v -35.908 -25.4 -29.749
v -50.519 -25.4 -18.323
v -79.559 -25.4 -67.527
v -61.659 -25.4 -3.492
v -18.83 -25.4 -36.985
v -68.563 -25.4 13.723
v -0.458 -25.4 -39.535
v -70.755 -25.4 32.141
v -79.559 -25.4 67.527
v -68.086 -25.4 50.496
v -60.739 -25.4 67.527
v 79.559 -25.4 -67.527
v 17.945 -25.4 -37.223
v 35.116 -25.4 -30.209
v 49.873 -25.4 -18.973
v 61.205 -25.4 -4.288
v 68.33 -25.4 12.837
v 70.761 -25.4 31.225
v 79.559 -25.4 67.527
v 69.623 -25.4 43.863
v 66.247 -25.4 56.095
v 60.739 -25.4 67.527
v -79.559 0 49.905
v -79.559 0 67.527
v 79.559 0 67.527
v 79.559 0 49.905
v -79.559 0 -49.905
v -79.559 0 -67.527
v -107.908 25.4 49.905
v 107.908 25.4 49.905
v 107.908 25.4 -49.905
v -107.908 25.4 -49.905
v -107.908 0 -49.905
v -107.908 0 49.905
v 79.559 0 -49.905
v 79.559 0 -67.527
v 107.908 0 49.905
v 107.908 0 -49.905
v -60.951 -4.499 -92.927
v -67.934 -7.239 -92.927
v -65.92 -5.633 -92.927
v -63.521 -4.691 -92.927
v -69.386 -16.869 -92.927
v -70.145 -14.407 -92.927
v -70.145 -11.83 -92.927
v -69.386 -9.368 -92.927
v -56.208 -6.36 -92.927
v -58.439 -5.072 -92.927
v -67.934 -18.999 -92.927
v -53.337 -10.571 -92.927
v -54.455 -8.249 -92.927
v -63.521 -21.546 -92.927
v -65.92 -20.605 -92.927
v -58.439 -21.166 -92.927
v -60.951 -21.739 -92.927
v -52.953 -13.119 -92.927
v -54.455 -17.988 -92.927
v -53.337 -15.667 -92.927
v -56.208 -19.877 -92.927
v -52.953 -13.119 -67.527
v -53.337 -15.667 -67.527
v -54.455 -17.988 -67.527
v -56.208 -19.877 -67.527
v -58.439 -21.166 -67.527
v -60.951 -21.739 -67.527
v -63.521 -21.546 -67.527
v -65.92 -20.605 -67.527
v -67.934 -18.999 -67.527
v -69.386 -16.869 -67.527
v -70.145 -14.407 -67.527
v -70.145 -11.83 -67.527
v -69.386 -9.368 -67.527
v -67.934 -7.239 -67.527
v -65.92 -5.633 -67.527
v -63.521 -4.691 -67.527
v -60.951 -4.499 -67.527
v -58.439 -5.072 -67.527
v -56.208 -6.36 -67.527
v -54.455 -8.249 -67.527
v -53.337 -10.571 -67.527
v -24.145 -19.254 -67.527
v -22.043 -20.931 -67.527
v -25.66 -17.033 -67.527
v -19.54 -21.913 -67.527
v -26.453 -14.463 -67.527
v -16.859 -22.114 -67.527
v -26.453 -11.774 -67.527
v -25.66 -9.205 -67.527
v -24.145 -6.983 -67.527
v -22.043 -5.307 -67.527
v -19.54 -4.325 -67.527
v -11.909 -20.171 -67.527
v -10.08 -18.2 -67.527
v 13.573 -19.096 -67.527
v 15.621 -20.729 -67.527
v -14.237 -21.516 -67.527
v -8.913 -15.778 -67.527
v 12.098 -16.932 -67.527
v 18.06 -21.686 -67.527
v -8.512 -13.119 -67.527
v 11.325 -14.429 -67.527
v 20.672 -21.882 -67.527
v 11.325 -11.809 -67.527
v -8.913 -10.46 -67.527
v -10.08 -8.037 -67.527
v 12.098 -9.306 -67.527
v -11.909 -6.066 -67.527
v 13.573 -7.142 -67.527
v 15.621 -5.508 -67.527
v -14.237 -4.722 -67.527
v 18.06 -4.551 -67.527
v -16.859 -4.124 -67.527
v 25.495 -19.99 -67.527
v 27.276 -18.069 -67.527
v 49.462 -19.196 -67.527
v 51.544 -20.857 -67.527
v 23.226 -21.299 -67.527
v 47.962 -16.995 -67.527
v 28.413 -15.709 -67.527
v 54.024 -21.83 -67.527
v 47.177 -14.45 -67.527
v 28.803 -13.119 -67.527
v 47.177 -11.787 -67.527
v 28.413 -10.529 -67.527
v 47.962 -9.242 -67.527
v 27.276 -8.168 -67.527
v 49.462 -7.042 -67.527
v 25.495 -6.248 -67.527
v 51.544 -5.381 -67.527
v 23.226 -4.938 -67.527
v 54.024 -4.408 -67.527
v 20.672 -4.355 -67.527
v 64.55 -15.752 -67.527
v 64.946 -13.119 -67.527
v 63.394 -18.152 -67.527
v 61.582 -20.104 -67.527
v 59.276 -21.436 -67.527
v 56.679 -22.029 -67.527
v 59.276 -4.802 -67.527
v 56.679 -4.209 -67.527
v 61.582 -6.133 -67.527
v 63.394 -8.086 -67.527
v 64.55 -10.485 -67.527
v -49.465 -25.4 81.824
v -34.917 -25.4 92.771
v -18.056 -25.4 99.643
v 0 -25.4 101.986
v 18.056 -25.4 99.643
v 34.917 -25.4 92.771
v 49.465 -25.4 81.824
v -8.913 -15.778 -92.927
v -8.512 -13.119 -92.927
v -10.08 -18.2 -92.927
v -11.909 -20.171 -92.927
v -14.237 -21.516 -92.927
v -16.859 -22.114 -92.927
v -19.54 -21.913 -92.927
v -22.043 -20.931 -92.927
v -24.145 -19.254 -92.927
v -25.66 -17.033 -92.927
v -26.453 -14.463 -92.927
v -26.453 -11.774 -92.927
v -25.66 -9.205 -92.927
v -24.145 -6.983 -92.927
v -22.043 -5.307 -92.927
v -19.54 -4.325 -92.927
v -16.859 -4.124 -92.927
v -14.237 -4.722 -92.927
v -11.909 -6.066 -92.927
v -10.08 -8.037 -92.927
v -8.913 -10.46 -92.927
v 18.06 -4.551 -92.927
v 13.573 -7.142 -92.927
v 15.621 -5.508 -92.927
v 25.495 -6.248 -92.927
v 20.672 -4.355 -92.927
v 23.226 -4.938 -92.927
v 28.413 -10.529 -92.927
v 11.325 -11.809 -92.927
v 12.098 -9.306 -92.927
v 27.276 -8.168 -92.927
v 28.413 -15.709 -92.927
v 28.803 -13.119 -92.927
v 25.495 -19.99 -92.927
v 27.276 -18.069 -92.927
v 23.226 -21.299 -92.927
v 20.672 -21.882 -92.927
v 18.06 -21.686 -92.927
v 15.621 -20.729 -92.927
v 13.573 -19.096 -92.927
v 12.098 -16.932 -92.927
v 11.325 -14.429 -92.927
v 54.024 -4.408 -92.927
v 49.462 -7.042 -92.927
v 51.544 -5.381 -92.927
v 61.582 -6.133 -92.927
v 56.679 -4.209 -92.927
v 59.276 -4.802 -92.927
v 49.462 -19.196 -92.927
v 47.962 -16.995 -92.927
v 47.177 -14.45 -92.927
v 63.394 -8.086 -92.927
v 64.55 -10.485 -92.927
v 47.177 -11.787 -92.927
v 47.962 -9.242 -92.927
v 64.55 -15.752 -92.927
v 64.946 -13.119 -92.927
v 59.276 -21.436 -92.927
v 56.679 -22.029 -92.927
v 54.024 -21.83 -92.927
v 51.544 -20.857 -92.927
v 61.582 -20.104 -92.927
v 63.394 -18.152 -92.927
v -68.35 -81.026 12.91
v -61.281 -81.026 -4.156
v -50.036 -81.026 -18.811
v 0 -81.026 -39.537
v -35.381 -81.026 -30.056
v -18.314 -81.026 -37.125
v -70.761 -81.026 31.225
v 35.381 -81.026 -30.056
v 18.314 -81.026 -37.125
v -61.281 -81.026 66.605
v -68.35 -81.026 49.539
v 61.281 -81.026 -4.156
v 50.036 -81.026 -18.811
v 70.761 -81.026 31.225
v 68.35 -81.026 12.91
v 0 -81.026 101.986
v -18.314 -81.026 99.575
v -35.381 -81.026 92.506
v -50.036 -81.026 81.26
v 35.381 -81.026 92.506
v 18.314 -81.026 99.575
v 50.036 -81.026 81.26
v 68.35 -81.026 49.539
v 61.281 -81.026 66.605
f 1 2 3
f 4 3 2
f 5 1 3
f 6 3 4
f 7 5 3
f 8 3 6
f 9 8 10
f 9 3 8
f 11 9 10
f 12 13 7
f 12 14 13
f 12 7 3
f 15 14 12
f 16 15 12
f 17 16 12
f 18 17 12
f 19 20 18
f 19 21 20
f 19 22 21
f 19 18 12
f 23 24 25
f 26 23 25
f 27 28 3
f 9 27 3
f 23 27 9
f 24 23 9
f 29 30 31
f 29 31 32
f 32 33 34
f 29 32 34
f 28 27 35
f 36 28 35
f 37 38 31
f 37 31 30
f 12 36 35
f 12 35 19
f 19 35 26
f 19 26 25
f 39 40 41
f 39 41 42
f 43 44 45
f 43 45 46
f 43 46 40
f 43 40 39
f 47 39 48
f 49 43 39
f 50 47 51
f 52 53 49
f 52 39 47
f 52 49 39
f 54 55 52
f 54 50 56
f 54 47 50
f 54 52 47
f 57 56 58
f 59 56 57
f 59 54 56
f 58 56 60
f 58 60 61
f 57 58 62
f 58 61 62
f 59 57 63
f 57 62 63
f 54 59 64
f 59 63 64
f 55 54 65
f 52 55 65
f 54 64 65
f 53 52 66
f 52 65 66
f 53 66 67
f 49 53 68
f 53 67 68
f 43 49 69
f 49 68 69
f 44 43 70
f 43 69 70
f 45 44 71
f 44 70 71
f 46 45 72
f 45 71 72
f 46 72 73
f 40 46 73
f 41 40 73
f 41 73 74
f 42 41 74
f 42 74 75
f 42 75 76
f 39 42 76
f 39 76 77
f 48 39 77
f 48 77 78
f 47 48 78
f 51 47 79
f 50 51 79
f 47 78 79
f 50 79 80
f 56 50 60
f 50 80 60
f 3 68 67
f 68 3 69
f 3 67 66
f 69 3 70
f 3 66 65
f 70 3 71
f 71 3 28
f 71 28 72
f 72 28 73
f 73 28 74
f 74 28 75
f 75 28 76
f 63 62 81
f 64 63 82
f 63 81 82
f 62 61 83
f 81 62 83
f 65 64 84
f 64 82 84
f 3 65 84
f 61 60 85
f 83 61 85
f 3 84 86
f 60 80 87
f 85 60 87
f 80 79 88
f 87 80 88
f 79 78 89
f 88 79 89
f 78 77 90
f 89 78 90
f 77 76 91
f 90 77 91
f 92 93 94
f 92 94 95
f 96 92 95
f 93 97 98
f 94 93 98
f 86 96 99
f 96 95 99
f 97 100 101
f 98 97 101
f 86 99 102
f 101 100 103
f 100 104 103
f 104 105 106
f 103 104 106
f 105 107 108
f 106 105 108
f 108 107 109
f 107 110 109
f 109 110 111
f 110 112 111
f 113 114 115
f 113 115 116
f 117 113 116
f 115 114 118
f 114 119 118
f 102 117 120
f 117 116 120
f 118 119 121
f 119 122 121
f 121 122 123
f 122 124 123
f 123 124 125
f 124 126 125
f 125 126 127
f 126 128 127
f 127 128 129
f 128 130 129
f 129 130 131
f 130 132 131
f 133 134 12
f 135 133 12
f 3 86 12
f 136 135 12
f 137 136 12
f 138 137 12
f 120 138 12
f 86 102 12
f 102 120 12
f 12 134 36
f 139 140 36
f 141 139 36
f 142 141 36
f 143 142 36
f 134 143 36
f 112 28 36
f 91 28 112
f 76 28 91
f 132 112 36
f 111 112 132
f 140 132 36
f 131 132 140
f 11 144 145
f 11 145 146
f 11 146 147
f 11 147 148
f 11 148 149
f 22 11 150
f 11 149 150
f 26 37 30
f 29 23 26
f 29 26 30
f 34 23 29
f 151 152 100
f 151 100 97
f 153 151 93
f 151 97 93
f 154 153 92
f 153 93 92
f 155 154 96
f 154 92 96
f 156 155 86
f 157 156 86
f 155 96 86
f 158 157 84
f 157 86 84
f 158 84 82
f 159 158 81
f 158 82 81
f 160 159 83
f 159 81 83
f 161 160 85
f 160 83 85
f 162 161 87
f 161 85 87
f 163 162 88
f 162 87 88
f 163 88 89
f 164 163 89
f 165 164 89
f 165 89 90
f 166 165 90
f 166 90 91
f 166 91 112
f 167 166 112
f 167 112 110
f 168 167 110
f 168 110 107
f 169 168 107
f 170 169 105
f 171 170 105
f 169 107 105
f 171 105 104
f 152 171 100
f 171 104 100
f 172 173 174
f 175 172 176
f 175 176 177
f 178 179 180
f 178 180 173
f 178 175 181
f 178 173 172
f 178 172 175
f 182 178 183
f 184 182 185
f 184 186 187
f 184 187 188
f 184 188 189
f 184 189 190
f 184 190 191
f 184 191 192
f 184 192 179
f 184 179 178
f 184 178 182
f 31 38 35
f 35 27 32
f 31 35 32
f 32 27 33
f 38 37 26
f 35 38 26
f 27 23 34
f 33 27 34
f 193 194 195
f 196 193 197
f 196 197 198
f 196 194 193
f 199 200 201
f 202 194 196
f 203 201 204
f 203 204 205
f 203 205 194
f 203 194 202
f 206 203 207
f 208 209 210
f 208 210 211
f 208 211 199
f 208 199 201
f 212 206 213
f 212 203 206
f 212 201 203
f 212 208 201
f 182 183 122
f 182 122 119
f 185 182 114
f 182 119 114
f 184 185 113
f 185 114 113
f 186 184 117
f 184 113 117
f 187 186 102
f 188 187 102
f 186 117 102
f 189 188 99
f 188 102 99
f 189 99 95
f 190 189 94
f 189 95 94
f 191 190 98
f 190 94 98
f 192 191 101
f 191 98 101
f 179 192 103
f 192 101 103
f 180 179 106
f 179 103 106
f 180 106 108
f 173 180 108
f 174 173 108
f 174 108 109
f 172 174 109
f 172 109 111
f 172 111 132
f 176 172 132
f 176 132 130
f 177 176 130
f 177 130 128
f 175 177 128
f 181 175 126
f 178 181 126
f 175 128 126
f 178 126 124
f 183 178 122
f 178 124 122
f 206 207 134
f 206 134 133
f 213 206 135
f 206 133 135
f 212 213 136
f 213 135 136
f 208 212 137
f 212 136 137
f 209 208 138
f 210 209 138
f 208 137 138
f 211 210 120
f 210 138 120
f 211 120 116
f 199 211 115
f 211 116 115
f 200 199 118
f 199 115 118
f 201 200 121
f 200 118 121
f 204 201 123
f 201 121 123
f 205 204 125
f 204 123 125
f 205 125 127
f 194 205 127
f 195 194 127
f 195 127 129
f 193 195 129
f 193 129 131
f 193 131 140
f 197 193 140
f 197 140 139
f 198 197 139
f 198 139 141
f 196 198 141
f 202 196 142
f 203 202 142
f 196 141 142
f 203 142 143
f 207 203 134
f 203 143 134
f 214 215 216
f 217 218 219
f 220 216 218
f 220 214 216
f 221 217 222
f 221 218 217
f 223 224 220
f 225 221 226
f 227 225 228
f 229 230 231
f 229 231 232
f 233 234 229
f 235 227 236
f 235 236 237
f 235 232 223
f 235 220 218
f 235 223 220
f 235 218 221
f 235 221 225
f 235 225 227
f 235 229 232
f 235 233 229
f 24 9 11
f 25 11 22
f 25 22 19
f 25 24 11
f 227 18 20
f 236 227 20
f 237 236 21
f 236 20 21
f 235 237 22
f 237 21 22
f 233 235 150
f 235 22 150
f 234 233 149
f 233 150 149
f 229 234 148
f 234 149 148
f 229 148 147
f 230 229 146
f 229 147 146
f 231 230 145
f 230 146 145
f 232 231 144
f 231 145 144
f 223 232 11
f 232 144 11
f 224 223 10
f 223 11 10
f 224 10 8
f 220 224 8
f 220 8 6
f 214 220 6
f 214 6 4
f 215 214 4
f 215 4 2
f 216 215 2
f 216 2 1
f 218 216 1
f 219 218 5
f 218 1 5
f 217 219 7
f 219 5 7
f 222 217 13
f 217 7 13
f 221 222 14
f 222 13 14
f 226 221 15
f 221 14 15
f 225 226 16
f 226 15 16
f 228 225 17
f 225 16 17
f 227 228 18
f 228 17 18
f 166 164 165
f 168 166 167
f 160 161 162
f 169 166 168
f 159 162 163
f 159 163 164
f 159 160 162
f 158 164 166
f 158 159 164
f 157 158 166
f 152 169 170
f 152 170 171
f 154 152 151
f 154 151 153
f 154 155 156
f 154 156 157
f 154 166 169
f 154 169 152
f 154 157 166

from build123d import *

# Parameters (mm, degrees)
F0_W     = 159.117624
F0_H     = 135.05447
F1_DEPTH = 25.4
F2_R     = 70.761251
F3_DEPTH = 55.626
F4_R     = 8.644359
F4_R_2   = 9.020495
F4_R_3   = 8.787981
F4_R_4   = 8.934689
F5_DEPTH = 25.4
F6_W     = 215.815008
F6_H     = 99.81057
F7_DEPTH = 25.4


with BuildPart() as f1:
    # F0 (on Front) → F1 (new body)
    with BuildSketch(Plane.XZ):
        Rectangle(F0_W, F0_H)
    extrude(amount=F1_DEPTH)

    # F2 (on face) → F3 (join)
    with BuildSketch(Plane.XZ.offset(25.4)):
        with Locations((0, 31.224668)):
            Circle(F2_R)
    extrude(amount=F3_DEPTH)

    # F4 (on face) → F5 (join)
    with BuildSketch(Plane(origin=(0, 0, -67.527235), x_dir=(1, 0, 0), z_dir=(0, 0, -1))):
        with Locations((-61.597422, 13.11885)):
            Circle(F4_R)
        with Locations((-17.532768, 13.11885)):
            Circle(F4_R_2)
        with Locations((20.015284, 13.11885)):
            Circle(F4_R_3)
        with Locations((56.011762, 13.11885)):
            Circle(F4_R_4)
    extrude(amount=F5_DEPTH)

    # F6 (on face) → F7 (join)
    with BuildSketch(Plane(origin=(0, 0, 0), x_dir=(-1, 0, 0), z_dir=(0, 1, 0))):
        Rectangle(F6_W, F6_H)
    extrude(amount=F7_DEPTH)


solid = f1.part
